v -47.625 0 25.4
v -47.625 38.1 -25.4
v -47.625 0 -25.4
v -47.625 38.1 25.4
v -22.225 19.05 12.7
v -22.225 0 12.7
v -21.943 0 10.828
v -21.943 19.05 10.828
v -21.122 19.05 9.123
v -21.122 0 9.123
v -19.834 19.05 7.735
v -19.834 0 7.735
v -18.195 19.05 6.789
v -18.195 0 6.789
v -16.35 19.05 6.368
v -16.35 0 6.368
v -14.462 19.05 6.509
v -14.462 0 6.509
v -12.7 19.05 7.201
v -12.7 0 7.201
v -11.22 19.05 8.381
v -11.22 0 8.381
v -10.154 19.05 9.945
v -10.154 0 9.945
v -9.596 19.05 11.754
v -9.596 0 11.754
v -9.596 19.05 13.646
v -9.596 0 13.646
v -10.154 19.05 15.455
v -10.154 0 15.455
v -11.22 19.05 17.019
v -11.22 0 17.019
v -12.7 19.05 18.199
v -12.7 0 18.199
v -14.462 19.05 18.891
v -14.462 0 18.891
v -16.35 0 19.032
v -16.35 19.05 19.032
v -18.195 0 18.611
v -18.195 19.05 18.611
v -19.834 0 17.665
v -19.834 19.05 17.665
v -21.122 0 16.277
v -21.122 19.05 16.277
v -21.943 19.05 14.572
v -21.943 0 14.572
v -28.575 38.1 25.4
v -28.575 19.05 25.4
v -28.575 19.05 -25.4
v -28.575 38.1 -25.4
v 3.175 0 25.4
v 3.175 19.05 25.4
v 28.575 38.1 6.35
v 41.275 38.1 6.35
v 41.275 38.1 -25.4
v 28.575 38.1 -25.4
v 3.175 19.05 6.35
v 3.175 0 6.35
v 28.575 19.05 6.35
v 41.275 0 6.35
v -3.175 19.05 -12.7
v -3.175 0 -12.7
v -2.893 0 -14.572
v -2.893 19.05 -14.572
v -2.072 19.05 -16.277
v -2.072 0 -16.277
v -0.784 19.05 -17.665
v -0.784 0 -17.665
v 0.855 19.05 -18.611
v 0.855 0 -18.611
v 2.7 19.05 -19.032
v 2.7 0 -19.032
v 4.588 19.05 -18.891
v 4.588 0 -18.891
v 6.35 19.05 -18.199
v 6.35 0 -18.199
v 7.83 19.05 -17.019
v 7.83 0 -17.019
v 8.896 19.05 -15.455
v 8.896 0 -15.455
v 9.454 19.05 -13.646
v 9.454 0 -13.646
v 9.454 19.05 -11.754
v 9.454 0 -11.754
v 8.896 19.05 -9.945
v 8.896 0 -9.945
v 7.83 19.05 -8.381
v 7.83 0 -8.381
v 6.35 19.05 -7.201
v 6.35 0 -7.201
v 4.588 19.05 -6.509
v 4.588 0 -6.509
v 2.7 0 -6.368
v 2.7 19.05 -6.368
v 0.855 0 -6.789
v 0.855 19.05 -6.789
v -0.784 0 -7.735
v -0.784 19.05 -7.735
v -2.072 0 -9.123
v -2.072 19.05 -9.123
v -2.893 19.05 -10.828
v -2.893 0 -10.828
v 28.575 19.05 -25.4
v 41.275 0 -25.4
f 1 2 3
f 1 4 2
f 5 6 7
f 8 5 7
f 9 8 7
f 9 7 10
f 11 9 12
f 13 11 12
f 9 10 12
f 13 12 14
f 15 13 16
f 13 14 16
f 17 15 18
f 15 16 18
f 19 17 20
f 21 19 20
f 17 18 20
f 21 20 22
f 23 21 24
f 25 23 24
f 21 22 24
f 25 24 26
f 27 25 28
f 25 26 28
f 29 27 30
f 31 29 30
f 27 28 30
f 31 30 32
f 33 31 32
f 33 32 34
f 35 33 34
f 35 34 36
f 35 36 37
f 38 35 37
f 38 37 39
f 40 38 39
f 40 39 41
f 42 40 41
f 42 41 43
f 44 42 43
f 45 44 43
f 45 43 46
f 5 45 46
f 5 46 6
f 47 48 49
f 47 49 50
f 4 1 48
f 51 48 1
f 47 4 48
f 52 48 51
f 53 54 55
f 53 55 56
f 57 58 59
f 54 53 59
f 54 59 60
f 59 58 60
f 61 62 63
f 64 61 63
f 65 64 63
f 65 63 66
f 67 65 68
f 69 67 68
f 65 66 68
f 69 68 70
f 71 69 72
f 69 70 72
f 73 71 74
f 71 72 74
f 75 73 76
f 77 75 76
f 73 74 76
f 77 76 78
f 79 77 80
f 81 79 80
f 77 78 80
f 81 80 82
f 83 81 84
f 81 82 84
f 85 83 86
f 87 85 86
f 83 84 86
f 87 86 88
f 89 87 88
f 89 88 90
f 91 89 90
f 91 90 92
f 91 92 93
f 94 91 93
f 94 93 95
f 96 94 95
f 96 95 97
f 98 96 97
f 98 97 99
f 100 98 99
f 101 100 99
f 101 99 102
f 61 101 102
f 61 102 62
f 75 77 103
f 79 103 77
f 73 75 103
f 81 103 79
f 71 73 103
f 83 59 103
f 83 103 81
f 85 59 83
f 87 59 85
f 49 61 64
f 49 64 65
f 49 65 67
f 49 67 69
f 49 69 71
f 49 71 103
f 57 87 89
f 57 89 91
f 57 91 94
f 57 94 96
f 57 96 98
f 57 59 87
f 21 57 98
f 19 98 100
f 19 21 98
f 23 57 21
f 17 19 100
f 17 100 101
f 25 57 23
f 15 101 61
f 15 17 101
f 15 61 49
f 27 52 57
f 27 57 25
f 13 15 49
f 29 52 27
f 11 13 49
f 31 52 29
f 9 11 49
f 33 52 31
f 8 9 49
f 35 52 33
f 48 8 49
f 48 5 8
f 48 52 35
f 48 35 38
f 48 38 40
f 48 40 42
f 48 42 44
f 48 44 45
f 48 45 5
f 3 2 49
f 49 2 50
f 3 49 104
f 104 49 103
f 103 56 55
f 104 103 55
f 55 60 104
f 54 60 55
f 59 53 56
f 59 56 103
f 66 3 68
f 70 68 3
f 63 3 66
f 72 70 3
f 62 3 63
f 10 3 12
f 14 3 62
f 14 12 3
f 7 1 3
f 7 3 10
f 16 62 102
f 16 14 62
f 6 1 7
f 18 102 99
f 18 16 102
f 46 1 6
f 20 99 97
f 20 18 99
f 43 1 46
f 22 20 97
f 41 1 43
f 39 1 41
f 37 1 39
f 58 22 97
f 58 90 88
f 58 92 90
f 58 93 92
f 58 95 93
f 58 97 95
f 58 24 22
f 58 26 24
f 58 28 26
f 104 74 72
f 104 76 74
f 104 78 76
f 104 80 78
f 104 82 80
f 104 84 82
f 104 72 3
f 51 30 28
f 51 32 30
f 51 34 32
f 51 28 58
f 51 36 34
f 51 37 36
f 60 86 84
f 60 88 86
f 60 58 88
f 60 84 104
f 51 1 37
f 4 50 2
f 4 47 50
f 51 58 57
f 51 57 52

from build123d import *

# Parameters (mm, degrees)
BASE_FEATURE_DEPTH         = 25.4
SKETCH2_W                  = 38.1
SKETCH2_H                  = 19.05
ALTITUDUAL_CUT_DEPTH       = 67.067470248
F_1_2_0_5_DIAMETER_HOLES_D = 12.7


with BuildPart() as part:
    # Sketch1 → Base Feature (new, symmetric)
    with BuildSketch(Plane.XY):
        Polygon((-47.625, 0), (41.275, 0), (41.275, 38.1), (28.575, 38.1), (28.575, 19.05), (-28.575, 19.05), (-28.575, 38.1), (-47.625, 38.1), align=None)
    extrude(amount=BASE_FEATURE_DEPTH, both=True)

    # Sketch2 → Altitudual Cut (cut, through all)
    with BuildSketch(Plane.XZ):
        with Locations((22.225, 15.875)):
            Rectangle(SKETCH2_W, SKETCH2_H)
    extrude(amount=-ALTITUDUAL_CUT_DEPTH, mode=Mode.SUBTRACT)

    # 1/2 (0.5) Diameter Holes (through all)
    with Locations(Plane(origin=(0, 19.05, 0), x_dir=(1, 0, 0), z_dir=(0, 1, 0))):
        with Locations((-15.875, -12.7), (3.175, 12.7)):
            Hole(F_1_2_0_5_DIAMETER_HOLES_D / 2)


solid = part.part
